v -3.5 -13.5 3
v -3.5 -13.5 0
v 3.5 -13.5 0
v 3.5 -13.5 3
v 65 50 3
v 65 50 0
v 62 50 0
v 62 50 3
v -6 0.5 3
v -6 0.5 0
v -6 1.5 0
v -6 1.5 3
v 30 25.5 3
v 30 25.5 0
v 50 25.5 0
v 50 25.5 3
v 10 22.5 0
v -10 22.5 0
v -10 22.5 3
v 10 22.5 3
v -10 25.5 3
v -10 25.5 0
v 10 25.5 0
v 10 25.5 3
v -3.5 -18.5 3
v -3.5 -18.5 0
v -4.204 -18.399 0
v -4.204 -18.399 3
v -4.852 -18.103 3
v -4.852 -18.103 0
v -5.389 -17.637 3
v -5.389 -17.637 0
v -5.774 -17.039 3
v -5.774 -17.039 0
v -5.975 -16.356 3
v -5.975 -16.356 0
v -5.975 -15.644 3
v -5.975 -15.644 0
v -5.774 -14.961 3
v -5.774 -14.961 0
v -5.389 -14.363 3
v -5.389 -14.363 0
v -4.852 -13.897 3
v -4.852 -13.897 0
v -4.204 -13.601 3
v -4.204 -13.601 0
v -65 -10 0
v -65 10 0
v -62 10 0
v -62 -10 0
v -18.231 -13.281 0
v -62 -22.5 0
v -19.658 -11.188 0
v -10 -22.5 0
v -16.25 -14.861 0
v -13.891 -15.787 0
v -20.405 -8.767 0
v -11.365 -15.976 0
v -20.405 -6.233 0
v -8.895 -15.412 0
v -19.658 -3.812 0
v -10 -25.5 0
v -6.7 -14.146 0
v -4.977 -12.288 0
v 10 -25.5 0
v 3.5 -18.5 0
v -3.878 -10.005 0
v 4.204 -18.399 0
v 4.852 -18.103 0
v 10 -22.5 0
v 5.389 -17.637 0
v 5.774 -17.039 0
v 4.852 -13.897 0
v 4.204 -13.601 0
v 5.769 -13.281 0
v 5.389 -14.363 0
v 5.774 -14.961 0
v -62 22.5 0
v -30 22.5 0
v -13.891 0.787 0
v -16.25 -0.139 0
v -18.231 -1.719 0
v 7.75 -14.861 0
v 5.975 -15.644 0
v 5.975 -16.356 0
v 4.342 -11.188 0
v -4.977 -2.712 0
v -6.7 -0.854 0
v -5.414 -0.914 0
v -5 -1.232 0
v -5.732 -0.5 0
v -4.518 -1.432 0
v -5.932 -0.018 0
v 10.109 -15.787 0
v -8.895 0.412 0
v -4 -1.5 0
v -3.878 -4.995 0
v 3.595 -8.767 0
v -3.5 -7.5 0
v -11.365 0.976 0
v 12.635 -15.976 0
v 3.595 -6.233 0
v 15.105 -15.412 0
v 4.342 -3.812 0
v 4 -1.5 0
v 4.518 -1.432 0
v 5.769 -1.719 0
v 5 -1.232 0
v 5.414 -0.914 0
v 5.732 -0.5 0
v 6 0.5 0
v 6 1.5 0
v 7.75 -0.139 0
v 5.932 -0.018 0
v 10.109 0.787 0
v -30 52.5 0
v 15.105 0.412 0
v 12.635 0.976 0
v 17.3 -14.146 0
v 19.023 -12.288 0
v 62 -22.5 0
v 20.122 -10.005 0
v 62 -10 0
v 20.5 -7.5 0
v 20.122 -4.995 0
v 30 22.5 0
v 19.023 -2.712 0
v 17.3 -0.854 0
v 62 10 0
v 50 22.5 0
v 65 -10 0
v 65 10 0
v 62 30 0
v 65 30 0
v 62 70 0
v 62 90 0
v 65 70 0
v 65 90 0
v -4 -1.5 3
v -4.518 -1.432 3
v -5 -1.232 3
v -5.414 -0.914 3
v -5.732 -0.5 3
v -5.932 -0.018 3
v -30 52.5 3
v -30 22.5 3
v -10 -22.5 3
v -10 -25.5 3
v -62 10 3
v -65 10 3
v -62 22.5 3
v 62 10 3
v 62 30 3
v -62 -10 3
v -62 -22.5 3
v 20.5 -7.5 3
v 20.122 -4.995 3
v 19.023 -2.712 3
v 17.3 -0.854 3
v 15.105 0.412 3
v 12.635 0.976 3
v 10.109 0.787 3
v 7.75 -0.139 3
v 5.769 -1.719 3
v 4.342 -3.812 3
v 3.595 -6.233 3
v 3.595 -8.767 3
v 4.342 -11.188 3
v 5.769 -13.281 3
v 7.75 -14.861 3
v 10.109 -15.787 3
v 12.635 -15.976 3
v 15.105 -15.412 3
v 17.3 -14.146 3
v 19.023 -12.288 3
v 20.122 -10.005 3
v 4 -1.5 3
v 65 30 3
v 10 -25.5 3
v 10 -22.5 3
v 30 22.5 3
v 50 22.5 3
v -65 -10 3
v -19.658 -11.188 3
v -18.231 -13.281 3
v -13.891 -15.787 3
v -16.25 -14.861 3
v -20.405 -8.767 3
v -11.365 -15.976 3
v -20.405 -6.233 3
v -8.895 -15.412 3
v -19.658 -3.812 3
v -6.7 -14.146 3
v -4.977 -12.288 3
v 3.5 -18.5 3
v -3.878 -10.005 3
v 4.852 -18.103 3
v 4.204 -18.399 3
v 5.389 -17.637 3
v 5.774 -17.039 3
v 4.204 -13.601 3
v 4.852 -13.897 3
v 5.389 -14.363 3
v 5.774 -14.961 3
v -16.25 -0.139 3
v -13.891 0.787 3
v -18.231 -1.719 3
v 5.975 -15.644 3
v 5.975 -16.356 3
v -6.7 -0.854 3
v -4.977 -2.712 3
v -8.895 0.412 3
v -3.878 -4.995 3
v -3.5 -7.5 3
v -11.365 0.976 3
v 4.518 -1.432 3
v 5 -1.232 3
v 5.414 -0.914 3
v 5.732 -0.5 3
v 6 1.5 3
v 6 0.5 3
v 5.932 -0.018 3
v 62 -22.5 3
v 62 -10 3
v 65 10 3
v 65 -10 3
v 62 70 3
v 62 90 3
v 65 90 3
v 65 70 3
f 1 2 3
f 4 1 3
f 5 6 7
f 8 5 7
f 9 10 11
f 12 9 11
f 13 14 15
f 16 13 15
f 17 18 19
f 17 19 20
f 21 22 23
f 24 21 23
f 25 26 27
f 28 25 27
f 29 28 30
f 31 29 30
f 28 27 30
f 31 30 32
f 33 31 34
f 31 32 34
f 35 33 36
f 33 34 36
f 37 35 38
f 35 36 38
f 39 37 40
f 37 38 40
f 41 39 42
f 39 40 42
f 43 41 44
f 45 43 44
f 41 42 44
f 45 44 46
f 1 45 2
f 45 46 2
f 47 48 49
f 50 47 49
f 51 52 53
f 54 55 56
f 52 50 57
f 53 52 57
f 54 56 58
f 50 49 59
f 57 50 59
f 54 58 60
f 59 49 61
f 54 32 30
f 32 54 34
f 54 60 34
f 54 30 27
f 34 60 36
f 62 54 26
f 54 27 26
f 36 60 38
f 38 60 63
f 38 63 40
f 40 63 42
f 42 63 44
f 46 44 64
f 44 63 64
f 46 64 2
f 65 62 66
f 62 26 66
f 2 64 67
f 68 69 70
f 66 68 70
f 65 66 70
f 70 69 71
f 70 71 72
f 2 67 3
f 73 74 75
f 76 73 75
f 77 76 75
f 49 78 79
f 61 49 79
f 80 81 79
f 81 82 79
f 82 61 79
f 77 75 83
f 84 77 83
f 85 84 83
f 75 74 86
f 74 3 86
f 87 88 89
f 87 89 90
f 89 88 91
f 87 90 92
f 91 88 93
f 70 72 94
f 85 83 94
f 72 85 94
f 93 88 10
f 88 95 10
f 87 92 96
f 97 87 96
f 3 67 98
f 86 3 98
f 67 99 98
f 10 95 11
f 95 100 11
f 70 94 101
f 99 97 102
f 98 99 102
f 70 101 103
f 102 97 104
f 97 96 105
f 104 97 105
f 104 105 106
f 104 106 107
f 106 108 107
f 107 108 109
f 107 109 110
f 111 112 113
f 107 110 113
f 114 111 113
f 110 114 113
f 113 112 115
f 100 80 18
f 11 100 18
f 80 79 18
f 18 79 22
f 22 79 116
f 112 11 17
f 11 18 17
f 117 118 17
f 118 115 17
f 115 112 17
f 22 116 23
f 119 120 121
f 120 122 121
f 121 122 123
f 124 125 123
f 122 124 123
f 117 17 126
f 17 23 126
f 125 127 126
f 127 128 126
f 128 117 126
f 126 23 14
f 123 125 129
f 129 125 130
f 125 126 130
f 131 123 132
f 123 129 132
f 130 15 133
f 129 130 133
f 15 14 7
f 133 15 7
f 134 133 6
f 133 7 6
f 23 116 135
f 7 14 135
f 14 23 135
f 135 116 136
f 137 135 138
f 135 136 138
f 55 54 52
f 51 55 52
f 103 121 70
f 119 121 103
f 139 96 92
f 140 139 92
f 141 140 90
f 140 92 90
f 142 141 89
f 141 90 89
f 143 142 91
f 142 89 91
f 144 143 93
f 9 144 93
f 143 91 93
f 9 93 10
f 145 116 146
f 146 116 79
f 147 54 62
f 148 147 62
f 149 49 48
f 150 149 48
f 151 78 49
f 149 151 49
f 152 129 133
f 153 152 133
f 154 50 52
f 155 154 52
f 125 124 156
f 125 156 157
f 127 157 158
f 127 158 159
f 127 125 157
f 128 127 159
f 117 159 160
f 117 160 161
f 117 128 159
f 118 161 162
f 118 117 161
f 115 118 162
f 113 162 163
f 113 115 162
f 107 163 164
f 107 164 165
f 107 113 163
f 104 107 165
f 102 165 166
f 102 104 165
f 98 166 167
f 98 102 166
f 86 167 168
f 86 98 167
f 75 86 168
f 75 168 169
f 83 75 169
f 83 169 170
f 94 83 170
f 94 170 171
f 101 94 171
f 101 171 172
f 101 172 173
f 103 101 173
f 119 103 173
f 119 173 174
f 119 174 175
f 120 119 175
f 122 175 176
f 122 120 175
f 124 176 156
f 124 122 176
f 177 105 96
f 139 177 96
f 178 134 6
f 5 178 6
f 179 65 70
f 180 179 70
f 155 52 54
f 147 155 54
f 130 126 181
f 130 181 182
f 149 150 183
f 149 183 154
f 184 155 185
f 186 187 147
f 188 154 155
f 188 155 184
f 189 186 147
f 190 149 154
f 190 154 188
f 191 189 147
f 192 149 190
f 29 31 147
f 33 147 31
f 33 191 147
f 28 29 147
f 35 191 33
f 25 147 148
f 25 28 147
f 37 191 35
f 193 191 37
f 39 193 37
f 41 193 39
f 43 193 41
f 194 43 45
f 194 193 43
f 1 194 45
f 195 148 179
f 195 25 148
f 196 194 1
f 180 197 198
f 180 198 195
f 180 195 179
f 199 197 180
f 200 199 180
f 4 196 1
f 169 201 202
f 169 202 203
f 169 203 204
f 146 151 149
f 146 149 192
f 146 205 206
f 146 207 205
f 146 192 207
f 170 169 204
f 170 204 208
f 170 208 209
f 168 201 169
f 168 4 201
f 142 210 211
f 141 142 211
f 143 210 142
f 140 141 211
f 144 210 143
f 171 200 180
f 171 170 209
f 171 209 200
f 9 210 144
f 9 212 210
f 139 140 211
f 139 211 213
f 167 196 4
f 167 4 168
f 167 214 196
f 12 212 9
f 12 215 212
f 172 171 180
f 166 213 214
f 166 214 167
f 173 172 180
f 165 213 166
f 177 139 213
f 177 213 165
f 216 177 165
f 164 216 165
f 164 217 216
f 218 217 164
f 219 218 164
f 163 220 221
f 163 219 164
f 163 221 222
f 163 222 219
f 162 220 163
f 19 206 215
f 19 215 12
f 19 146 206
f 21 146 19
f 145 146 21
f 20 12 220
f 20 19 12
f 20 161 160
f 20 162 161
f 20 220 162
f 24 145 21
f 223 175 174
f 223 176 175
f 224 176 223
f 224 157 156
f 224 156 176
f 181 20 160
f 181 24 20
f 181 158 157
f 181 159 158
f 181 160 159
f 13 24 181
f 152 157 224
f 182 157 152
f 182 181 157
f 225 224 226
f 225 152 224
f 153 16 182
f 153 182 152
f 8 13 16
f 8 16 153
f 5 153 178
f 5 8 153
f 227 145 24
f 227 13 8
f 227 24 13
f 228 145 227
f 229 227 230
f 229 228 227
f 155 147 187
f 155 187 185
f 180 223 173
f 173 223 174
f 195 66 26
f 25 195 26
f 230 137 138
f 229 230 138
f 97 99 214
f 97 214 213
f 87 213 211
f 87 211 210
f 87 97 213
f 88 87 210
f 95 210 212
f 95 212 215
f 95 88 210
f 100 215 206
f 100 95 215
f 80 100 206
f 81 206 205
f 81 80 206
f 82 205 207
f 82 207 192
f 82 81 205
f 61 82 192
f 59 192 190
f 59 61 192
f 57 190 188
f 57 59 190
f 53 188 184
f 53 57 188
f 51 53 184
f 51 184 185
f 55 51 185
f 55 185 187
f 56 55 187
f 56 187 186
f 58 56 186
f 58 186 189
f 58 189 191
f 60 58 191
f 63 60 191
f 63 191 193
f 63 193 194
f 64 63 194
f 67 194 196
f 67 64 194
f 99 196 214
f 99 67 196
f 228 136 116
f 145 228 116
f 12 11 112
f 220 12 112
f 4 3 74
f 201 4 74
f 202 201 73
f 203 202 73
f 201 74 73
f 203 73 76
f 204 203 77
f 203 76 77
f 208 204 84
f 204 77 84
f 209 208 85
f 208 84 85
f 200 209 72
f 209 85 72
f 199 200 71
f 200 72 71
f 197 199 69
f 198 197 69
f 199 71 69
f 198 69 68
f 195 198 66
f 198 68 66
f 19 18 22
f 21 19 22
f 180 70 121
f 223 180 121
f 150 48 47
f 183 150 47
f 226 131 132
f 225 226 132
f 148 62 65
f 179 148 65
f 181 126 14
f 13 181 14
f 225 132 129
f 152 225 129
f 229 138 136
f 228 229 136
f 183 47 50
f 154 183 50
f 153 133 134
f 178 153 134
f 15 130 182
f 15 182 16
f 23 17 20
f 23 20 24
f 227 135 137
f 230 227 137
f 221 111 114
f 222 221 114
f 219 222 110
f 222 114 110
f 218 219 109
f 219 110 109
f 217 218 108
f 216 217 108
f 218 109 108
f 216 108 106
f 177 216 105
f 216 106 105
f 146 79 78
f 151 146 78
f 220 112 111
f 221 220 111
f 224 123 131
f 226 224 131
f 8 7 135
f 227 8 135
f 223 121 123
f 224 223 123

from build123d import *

# Parameters (mm, degrees)
SKETCH4_R           = 8.5
SKETCH4_W           = 20
SKETCH4_H           = 3
BOSS_EXTRUDE2_DEPTH = 3


with BuildPart() as part:
    # Sketch4 → Boss-Extrude2 (new body)
    with BuildSketch(Plane.XY):
        Polygon((62, 90), (-30, 52.5), (-30, 22.5), (-62, 22.5), (-62, 10), (-65, 10), (-65, -10), (-62, -10), (-62, -22.5), (-10, -22.5), (-10, -25.5), (10, -25.5), (10, -22.5), (62, -22.5), (62, -10), (65, -10), (65, 10), (62, 10), (62, 22.5), (62, 30), (65, 30), (65, 50), (62, 50), (62, 70), (65, 70), (65, 90), align=None)
        with Locations((-12, -7.5)):
            Circle(SKETCH4_R, mode=Mode.SUBTRACT)
        with Locations((12, -7.5)):
            Circle(SKETCH4_R, mode=Mode.SUBTRACT)
        with BuildLine():
            Line((-3.5, -13.5), (3.5, -13.5))
            ThreePointArc((3.5, -13.5), (6, -16), (3.5, -18.5))
            Line((3.5, -18.5), (-3.5, -18.5))
            ThreePointArc((-3.5, -18.5), (-6, -16), (-3.5, -13.5))
        make_face(mode=Mode.SUBTRACT)
        with BuildLine():
            Line((4, -1.5), (-4, -1.5))
            ThreePointArc((-4, -1.5), (-5.414213562, -0.914213562), (-6, 0.5))
            Line((-6, 0.5), (-6, 1.5))
            Line((-6, 1.5), (6, 1.5))
            Line((6, 1.5), (6, 0.5))
            ThreePointArc((6, 0.5), (5.414213562, -0.914213562), (4, -1.5))
        make_face(mode=Mode.SUBTRACT)
        with Locations((0, 24)):
            Rectangle(SKETCH4_W, SKETCH4_H, mode=Mode.SUBTRACT)
        with Locations((40, 24)):
            Rectangle(SKETCH4_W, SKETCH4_H, mode=Mode.SUBTRACT)
    extrude(amount=BOSS_EXTRUDE2_DEPTH)


solid = part.part
